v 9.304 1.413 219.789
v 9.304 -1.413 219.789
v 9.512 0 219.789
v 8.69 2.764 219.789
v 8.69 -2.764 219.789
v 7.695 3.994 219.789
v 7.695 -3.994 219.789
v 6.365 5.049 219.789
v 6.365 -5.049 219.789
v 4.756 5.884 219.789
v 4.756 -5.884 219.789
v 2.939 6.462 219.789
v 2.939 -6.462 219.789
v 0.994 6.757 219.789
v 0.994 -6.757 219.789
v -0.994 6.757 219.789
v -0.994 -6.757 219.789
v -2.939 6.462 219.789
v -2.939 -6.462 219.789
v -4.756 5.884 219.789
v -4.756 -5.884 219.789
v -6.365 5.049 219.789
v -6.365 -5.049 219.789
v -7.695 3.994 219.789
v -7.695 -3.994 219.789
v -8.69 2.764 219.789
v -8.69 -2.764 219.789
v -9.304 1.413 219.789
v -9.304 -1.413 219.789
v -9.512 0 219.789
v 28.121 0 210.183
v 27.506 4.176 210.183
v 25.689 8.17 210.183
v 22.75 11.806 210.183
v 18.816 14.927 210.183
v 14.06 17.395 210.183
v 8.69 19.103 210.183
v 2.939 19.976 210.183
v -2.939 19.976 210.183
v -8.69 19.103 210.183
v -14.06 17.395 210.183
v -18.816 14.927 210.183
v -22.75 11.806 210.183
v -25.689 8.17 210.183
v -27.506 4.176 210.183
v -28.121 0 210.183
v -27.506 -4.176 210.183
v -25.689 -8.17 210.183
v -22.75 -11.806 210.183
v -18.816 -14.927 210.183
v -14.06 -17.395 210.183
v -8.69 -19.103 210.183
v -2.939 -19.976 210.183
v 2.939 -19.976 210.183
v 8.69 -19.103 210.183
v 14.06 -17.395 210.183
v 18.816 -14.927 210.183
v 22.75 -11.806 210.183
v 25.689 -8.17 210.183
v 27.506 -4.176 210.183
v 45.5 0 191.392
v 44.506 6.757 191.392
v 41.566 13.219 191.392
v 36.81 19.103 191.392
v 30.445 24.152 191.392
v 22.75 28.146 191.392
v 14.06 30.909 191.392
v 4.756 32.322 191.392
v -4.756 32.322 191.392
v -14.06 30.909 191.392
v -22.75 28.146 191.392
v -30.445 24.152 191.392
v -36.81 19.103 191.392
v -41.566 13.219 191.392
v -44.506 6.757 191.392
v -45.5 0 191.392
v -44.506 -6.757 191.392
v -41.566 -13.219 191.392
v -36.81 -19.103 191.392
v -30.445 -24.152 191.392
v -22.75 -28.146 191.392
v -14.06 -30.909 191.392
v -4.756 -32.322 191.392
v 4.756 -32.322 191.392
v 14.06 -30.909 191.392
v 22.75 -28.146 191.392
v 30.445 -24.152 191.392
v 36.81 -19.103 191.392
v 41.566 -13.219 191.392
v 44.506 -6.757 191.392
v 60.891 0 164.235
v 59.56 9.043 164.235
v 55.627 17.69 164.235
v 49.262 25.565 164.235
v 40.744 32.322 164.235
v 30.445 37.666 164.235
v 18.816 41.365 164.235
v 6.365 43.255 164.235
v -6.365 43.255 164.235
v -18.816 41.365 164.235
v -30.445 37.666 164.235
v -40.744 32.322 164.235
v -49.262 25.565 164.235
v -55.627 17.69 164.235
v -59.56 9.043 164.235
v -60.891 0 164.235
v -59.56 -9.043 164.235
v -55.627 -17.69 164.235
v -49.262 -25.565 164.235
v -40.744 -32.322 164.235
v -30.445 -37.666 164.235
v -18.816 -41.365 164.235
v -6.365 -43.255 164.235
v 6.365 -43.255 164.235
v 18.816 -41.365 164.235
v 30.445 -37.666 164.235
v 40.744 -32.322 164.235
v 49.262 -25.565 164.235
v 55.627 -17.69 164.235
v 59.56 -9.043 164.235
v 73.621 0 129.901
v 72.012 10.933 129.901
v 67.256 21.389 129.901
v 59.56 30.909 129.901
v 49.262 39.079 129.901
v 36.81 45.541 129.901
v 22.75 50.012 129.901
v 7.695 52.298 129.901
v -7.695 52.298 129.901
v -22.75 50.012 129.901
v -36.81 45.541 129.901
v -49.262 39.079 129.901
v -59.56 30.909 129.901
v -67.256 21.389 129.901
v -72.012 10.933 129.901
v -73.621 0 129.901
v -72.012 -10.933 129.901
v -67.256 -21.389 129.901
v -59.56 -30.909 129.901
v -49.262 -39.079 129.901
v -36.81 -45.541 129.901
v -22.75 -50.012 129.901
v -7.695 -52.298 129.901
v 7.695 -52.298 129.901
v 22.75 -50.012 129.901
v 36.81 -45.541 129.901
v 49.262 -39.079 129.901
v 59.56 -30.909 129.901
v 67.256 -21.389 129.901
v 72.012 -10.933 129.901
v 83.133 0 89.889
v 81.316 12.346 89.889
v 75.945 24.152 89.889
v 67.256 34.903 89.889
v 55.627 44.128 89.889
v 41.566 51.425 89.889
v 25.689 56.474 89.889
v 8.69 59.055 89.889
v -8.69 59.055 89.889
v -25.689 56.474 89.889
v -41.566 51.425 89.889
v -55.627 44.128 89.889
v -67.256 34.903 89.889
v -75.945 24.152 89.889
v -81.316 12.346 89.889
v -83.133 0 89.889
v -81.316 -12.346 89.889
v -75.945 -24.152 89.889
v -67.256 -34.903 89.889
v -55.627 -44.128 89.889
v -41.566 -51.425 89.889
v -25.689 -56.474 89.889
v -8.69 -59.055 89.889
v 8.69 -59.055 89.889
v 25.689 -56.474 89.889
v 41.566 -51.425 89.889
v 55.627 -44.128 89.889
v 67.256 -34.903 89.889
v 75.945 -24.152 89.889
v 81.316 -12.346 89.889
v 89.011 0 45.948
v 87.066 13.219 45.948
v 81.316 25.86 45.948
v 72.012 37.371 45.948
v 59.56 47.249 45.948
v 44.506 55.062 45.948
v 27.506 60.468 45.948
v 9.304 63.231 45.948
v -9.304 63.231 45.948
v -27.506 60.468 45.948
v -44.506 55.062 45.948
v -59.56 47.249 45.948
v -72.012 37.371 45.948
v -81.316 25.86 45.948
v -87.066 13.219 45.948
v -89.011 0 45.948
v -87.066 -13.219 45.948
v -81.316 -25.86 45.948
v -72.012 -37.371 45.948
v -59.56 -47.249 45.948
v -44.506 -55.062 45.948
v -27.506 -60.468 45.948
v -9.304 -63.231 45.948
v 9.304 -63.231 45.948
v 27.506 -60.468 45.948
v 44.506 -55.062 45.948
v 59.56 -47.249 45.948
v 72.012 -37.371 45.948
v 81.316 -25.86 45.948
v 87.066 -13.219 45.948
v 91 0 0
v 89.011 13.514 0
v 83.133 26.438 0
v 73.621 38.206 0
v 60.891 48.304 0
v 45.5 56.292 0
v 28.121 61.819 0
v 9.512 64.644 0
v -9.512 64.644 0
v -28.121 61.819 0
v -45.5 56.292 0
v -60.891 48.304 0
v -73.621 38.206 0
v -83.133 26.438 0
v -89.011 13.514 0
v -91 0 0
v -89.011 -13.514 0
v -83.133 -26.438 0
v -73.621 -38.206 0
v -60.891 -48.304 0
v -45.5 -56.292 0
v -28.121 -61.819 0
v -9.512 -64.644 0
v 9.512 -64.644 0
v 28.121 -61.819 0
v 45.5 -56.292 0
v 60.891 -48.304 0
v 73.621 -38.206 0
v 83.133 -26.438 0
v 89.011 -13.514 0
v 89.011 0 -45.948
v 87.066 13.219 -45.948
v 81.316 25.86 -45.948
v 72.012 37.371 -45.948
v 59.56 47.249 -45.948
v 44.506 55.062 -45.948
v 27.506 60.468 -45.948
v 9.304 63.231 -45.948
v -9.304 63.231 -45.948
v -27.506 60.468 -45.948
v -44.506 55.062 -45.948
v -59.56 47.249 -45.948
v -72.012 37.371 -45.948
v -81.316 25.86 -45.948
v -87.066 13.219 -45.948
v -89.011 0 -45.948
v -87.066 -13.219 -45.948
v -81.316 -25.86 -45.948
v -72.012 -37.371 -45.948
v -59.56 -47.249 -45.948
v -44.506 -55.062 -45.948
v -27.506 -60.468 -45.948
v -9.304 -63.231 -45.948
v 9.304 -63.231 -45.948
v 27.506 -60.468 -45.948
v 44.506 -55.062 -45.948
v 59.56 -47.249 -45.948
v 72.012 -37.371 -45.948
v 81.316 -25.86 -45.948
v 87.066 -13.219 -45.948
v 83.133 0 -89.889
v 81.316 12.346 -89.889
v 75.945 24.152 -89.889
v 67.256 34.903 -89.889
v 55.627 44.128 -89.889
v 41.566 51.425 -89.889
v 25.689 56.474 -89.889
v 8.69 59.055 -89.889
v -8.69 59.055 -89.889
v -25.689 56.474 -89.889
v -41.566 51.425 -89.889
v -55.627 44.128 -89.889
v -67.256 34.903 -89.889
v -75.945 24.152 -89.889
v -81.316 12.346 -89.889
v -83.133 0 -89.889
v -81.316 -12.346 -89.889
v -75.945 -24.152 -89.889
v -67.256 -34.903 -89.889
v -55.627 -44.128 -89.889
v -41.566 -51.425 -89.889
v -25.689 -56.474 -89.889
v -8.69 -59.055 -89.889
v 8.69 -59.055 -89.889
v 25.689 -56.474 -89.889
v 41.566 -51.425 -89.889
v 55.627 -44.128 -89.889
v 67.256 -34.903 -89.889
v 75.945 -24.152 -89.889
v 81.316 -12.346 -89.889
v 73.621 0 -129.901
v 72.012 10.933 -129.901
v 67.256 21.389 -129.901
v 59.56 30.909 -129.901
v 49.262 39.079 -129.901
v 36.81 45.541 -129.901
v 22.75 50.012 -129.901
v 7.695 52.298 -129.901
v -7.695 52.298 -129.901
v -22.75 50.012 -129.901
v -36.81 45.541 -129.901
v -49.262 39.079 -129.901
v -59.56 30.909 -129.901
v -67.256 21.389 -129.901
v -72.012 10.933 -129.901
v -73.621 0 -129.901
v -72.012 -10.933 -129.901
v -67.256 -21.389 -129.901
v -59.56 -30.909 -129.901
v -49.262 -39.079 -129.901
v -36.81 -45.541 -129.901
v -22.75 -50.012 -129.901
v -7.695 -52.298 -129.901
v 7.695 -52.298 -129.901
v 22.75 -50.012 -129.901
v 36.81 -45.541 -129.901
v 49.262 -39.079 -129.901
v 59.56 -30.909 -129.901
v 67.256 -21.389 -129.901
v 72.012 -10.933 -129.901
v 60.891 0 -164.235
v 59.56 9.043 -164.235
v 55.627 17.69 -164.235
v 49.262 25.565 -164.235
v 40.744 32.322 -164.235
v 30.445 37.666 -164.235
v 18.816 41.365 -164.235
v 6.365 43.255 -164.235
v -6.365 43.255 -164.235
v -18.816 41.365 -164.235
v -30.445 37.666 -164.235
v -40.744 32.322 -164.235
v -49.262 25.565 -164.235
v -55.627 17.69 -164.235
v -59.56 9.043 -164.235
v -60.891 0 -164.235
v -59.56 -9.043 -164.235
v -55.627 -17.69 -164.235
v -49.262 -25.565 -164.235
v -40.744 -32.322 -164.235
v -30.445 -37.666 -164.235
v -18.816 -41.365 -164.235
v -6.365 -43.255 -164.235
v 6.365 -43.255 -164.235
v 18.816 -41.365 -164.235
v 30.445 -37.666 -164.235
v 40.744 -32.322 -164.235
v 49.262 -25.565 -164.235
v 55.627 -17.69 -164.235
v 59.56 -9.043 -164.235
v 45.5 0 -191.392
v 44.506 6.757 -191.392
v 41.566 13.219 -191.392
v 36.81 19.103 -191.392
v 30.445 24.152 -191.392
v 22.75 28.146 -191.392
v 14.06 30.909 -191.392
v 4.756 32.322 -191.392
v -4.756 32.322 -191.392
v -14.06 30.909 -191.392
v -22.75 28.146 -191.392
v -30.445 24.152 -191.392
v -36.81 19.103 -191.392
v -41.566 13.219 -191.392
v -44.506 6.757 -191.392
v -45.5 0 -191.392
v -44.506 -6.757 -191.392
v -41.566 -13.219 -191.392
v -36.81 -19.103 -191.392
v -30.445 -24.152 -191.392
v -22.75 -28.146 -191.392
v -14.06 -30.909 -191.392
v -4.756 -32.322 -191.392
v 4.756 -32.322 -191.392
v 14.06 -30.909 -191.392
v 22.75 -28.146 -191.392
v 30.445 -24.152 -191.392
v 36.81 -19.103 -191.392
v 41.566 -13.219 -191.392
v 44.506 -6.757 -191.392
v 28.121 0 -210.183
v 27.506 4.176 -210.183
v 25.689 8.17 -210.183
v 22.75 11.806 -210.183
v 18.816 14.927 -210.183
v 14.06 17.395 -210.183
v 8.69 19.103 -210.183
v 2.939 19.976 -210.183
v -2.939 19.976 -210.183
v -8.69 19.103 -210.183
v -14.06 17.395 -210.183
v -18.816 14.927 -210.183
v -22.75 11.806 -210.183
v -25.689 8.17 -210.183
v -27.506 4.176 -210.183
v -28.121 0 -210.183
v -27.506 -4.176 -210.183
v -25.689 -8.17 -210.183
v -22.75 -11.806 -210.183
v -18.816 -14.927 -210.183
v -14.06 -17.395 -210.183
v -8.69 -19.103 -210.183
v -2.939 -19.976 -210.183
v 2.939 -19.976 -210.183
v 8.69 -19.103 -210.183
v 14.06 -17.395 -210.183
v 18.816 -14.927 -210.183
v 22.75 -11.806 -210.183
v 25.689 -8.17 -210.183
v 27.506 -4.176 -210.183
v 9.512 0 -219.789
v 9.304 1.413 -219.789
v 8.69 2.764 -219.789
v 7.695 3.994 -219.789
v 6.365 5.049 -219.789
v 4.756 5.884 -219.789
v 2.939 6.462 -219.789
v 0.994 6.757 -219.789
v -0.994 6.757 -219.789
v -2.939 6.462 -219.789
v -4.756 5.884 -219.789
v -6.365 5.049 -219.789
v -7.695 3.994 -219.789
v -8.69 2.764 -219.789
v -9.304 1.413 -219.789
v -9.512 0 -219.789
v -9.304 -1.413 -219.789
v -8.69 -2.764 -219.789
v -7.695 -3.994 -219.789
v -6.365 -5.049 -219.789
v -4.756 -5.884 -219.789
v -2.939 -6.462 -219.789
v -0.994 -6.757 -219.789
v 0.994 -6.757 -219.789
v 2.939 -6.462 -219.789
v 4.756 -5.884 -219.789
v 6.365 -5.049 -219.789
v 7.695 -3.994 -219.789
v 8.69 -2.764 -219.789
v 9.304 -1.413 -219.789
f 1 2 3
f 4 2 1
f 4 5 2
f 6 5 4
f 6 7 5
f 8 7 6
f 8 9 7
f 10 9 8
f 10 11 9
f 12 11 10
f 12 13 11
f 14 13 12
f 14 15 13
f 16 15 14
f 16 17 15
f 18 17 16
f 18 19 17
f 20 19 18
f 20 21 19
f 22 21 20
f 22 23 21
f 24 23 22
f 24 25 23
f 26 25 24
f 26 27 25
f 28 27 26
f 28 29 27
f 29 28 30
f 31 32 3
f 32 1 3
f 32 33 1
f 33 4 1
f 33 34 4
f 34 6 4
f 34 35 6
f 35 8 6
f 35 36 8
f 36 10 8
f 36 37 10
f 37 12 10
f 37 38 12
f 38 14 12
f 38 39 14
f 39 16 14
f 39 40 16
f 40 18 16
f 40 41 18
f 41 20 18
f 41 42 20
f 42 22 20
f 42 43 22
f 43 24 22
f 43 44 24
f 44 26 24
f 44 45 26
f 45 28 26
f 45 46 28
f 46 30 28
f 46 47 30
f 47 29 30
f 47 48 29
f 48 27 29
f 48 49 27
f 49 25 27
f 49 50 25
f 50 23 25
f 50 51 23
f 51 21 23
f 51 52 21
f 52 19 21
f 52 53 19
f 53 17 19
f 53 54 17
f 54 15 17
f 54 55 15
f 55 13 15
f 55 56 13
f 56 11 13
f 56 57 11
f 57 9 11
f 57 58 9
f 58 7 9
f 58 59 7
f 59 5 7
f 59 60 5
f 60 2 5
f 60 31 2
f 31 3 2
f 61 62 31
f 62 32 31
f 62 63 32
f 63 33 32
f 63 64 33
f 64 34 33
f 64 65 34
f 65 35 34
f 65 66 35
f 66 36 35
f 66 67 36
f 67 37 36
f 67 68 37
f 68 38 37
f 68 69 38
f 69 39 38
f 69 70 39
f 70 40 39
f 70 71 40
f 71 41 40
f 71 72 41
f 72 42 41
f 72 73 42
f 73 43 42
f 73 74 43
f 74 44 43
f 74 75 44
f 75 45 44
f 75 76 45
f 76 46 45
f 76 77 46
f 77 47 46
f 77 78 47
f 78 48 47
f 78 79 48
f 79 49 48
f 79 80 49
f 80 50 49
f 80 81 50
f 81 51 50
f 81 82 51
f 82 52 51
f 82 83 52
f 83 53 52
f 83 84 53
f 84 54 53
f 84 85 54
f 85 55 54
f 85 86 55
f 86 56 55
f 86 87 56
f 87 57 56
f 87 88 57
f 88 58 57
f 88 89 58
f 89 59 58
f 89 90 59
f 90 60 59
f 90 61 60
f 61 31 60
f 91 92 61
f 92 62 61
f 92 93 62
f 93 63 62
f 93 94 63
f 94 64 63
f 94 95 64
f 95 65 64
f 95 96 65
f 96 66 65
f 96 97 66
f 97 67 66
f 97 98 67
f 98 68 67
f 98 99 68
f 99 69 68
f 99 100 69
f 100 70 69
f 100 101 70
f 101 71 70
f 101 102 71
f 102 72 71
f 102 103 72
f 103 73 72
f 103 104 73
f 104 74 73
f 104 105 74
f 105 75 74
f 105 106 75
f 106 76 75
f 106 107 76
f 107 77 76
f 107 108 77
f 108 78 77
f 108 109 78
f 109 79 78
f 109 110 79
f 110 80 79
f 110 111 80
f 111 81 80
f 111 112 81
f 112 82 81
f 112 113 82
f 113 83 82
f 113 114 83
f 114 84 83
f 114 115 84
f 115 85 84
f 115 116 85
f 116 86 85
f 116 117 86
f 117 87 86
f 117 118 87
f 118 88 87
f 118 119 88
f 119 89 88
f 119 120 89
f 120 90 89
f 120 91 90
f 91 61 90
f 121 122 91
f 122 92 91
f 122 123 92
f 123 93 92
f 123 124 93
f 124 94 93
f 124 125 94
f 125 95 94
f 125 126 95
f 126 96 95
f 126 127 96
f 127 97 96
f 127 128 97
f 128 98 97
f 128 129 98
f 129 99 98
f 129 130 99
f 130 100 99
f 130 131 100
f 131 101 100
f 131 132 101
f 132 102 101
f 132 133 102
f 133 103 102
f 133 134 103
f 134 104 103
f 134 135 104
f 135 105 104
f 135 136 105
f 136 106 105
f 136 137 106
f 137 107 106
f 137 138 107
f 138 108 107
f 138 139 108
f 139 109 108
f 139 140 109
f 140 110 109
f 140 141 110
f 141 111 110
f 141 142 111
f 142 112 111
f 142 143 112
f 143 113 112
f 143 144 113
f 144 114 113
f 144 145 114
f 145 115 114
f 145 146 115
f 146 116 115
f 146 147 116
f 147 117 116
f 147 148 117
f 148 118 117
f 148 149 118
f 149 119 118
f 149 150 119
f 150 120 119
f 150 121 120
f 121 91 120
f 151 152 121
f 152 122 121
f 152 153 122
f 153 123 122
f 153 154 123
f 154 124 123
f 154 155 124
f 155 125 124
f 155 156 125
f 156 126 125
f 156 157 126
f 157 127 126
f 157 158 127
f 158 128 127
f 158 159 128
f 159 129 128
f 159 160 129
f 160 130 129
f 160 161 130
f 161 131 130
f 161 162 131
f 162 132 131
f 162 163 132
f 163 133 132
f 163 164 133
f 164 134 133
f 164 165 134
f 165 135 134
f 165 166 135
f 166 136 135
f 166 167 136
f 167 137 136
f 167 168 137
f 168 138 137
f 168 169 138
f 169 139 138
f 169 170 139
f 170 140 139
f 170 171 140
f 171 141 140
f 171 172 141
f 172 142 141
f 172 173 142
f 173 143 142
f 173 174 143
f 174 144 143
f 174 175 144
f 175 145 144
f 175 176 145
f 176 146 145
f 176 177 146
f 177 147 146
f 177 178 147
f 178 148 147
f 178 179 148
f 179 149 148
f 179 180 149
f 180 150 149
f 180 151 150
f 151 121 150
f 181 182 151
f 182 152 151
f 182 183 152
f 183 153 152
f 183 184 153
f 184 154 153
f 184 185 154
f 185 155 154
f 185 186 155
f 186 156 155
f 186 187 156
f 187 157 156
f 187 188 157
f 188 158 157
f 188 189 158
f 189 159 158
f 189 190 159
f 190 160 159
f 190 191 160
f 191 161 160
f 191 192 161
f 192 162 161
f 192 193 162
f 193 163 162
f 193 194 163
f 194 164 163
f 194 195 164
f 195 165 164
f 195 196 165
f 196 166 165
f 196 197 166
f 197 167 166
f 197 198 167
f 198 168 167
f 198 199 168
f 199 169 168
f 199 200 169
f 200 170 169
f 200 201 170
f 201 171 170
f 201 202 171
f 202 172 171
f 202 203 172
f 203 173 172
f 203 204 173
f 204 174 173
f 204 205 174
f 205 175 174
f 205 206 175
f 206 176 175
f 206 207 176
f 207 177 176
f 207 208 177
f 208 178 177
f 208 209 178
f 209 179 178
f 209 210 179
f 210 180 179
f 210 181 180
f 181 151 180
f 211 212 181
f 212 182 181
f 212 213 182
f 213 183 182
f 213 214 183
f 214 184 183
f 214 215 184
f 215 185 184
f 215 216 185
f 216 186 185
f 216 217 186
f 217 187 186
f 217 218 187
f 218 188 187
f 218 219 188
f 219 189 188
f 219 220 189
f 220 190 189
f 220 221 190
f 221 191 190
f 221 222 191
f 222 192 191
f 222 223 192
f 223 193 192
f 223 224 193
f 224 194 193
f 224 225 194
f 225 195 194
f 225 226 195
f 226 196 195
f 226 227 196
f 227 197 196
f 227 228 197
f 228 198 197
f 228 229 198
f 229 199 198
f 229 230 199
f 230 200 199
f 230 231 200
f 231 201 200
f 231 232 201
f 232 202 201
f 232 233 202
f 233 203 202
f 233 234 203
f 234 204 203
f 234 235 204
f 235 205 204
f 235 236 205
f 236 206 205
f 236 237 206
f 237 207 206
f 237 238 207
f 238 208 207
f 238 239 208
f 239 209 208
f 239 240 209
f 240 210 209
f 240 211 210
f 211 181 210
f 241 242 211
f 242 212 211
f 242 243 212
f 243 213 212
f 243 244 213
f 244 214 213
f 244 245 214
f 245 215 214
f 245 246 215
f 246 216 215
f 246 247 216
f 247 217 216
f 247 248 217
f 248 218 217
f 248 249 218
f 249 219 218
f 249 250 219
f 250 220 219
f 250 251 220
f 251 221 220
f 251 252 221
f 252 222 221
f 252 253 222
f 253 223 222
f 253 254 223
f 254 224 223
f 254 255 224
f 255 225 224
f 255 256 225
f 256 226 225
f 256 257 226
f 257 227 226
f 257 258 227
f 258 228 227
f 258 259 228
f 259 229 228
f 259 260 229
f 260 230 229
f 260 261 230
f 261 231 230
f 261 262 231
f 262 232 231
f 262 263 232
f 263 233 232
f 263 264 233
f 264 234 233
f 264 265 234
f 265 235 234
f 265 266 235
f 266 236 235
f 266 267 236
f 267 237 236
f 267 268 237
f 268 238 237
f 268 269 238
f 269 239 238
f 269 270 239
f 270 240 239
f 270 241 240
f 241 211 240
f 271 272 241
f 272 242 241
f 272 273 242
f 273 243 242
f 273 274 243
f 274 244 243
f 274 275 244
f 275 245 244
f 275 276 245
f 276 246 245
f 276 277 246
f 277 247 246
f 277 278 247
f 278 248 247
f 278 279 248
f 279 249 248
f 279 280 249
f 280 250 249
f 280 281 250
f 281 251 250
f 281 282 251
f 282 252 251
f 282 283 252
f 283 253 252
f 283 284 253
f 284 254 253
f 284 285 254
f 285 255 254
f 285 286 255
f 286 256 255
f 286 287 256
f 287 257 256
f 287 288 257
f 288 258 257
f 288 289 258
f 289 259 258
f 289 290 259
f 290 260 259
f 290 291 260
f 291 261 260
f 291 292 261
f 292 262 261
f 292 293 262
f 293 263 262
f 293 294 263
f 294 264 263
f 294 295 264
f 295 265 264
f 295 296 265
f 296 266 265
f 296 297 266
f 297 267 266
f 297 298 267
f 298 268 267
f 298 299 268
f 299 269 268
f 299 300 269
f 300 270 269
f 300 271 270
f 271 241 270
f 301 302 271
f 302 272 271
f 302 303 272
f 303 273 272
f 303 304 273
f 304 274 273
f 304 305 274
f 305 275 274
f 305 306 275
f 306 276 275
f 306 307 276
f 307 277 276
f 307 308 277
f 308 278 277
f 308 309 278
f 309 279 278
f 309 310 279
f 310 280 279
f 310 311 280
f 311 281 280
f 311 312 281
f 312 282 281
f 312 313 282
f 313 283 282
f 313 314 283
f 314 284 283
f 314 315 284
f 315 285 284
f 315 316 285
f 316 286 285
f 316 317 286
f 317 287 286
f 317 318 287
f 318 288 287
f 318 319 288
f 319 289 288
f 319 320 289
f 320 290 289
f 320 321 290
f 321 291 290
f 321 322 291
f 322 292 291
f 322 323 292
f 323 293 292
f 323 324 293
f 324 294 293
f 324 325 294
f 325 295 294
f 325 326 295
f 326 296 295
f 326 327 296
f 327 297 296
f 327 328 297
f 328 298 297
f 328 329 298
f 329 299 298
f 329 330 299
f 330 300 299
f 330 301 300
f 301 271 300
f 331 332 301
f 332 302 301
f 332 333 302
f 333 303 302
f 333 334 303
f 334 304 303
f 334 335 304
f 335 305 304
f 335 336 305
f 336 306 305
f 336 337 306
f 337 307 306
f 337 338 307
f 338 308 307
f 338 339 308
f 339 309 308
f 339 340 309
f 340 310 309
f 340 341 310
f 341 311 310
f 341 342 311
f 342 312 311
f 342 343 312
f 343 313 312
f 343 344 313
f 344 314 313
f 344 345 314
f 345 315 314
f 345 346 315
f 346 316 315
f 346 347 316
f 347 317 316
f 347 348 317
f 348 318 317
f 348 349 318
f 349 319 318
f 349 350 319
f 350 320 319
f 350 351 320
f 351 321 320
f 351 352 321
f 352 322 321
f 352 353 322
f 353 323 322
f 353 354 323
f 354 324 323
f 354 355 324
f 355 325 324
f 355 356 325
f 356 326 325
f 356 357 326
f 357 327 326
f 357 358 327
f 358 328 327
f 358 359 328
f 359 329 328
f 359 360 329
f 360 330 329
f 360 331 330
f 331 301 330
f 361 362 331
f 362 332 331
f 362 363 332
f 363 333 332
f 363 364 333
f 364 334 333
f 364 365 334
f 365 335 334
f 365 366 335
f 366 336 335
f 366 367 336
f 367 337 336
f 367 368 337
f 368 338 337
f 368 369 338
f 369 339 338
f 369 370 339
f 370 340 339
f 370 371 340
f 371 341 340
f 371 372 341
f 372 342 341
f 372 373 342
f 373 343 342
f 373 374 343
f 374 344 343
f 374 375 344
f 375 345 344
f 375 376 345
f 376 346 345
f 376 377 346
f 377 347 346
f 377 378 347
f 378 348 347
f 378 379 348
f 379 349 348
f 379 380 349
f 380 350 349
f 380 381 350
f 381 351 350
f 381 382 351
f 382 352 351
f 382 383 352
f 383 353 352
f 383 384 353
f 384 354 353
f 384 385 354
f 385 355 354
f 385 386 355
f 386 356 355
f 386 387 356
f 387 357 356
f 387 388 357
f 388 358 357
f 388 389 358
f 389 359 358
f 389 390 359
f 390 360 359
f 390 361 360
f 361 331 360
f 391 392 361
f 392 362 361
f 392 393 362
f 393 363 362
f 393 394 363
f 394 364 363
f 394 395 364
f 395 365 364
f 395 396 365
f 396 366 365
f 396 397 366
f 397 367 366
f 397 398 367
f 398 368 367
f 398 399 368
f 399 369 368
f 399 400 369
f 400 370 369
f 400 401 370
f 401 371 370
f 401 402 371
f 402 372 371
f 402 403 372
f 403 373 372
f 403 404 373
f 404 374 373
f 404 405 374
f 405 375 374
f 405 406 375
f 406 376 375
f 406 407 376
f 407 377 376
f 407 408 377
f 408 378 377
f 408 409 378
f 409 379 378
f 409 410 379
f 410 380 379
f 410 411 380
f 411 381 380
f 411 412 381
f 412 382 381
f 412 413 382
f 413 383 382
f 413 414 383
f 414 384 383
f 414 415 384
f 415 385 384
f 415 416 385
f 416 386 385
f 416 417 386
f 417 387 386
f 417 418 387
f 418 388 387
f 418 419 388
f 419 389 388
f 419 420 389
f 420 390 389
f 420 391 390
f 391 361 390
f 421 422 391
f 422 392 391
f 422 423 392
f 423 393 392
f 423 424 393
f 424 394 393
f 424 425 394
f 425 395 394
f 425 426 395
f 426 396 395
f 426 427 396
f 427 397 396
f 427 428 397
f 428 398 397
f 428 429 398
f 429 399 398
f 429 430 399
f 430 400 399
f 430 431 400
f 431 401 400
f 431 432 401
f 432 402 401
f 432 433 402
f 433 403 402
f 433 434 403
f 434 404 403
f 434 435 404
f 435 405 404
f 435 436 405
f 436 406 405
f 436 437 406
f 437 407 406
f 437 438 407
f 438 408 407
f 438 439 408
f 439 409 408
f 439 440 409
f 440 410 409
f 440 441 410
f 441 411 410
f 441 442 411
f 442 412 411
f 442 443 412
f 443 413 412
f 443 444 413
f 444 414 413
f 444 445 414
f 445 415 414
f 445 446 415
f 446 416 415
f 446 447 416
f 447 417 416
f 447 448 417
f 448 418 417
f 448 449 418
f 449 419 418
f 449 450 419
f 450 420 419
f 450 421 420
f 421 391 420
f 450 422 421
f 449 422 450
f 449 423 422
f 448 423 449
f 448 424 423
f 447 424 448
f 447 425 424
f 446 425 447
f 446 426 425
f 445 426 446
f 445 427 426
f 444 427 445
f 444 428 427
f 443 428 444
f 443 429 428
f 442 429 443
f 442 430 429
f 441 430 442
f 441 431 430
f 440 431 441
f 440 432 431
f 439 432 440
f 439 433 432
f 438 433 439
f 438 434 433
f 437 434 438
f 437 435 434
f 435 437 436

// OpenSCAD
// Generated by SolidPython 1.0.1 on 2020-07-29 00:46:47


scale(v = [7, 5, 17]) {
	sphere(r = 13);
}
/***********************************************
*********      SolidPython code:      **********
************************************************
 
# import packages: SolidPython
from solid import *
from solid.utils import *
from itertools import chain, combinations, permutations


class Resize:

    def __init__(self, scad_file):
        self.scad_file = scad_file
        #self.scad_file = import_scad(scad_file)
        # cone/cylinder param:
        self.r1 = 0
        self.r2 = 0
        self.h = 0
        # rectangular prism param:
        self.w = 0
        self.l = 0
        # ellipse param:
        self.r = 0

    # import OpenScad code (file name corresponds to shape)


    # classify shape + parameters
    def assign(self, param1, param2, param3):
        if self.scad_file == 'cone.scad':
            self.r1 = param1
            self.r2 = param2
            self.h = param3
        elif self.scad_file == 'cylinder.scad':
            self.r1 = param1
            self.r2 = param2
            self.h = param3
        elif self.scad_file == 'rectangularPrism.scad':
            self.h = param1
            self.l = param2
            self.w = param3
        else:
            self.r = param1
            self.h = param2

    # resize parameters
    def iterate(self):
        x = range(3, 20, 2)
        i = 1
        if self.scad_file == 'cone.scad':
            tempList = list(permutations(x, 2))
            for temp in tempList:
                param1 = temp[0]
                param2 = temp[1]
                filepath = 'produced_scad_files/' + 'cone' + str(param1) + '_' + str(param2) + '_' + '.scad'
                scad_render_to_file(cylinder(h=param1, r1=param2, r2=0), filepath)

        elif self.scad_file == 'cylinder.scad':
            tempList = list(permutations(x, 3))
            for temp in tempList:
                param1 = temp[0]
                param2 = temp[1]
                filepath = 'produced_scad_files/' + 'cylinder' + str(param1) + '_' + str(param2) + '_' + '.scad'
                scad_render_to_file(cylinder(h=param1, r1=param2, r2=param2), filepath)

        elif self.scad_file == 'rectangularPrism.scad':
            tempList = list(permutations(x, 3))
            for temp in tempList:
                param1 = temp[0]
                param2 = temp[1]
                param3 = temp[2]
                filepath = 'produced_scad_files/' + 'rectangularPrism' + str(param1) + '_' + str(param2) + '_' + str(
                    param3) + '.scad'
                scad_render_to_file(cube(size=(param1, param2, param3)), filepath)

        elif self.scad_file == 'ellipse.scad':
            tempList = list(permutations(x, 4))
            for temp in tempList:
                param1 = temp[0]
                param2 = temp[1]
                param3 = temp[2]
                param4 = temp[3]
                filepath = 'produced_scad_files/' + 'ellipse' + str(param1) + '_' + str(param2) + '_' + str(param3) + '_' + str(param4) + '.scad'
                scad_render_to_file(scale([param1, param2, param3])(sphere(r=param4)), filepath)

    def render_to_scadfile(self):
        scad_render_to_file(scad, 'example.scad') 
 
************************************************/
